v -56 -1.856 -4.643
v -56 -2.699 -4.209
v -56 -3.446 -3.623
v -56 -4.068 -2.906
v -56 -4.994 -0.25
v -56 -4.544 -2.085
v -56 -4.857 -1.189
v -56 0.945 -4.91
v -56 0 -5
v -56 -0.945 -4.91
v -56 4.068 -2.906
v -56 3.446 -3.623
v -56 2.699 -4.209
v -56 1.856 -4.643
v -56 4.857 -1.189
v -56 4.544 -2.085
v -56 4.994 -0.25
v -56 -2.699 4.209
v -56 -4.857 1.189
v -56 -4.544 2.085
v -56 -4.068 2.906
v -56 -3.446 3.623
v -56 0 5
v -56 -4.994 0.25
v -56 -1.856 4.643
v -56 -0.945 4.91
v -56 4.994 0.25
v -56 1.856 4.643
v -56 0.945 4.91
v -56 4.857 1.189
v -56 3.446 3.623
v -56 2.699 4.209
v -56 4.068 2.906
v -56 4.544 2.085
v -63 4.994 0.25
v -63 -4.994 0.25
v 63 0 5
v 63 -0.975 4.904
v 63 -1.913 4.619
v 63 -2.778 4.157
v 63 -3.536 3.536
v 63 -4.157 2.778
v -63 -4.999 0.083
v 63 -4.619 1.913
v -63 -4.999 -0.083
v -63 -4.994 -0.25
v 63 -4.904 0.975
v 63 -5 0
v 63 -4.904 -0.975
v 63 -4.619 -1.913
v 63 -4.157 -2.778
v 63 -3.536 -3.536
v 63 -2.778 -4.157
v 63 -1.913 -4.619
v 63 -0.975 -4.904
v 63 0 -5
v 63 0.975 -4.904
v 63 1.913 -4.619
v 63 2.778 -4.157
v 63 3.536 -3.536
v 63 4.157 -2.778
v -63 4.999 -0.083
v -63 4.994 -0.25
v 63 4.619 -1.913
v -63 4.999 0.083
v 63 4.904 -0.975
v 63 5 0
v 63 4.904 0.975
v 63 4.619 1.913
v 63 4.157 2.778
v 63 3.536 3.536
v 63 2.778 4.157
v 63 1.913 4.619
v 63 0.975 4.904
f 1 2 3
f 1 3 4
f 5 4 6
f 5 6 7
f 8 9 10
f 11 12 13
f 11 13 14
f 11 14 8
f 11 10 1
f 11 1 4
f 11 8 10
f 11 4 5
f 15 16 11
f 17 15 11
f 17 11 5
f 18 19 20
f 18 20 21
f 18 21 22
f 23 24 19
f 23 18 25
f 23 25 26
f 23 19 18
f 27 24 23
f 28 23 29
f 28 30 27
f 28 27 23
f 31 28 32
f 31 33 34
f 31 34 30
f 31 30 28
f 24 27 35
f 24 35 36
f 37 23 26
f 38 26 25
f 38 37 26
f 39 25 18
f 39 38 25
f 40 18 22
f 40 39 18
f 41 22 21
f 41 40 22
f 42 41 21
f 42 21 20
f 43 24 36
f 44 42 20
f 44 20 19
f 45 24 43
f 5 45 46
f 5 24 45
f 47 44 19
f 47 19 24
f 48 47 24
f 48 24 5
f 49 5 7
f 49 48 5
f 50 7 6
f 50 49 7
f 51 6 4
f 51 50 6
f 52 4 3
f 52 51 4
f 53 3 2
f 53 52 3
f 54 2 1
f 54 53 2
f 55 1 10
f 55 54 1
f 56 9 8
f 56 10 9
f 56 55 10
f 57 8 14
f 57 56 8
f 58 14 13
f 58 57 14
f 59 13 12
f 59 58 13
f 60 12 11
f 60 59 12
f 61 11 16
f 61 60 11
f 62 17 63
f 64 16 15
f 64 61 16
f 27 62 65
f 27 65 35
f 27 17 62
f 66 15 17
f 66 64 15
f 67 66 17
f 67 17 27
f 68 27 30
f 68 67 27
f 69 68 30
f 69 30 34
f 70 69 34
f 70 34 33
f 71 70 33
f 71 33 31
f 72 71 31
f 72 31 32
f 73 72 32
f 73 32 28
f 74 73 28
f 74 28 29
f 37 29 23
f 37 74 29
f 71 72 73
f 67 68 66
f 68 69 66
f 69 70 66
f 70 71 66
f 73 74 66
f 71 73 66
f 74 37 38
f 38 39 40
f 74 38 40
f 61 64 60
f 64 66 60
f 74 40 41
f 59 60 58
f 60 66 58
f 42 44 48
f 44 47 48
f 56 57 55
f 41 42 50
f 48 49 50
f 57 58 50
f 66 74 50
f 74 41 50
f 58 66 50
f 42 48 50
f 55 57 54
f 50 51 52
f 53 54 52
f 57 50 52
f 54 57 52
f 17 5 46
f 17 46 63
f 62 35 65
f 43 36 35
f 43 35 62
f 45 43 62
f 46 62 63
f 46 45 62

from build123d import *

# Parameters (mm, degrees)
SKETCH1_W                   = 126
SKETCH1_H                   = 5
ENCAIXE_START               = -7
ENCAIXE_POTENCI_METRO_DEPTH = 7


with BuildPart() as part:
    # Sketch1 → Blank (revolve)
    with BuildSketch(Plane.XY, mode=Mode.PRIVATE) as blank_sk:
        with Locations((0, 2.5)):
            Rectangle(SKETCH1_W, SKETCH1_H)
    revolve(blank_sk.sketch.rotate(Axis((-63, 0, 0), (1, 0, 0)), 90), axis=Axis((-63, 0, 0), (1, 0, 0)))

    # Sketch2 → Encaixe - Potenciômetro (cut)
    with BuildSketch(Plane.ZY.offset(63).offset(ENCAIXE_START)):
        with BuildLine():
            Line((0.25, 4.993746089), (0.25, -4.993746089))
            ThreePointArc((0.25, -4.993746089), (3.622844187, -3.446012188), (5, 0))
            ThreePointArc((5, 0), (3.622844187, 3.446012188), (0.25, 4.993746089))
        make_face()
        with BuildLine():
            ThreePointArc((-0.25, 4.993746089), (-5, 0), (-0.25, -4.993746089))
            Line((-0.25, -4.993746089), (-0.25, 4.993746089))
        make_face()
    extrude(amount=ENCAIXE_POTENCI_METRO_DEPTH, mode=Mode.SUBTRACT)


solid = part.part
